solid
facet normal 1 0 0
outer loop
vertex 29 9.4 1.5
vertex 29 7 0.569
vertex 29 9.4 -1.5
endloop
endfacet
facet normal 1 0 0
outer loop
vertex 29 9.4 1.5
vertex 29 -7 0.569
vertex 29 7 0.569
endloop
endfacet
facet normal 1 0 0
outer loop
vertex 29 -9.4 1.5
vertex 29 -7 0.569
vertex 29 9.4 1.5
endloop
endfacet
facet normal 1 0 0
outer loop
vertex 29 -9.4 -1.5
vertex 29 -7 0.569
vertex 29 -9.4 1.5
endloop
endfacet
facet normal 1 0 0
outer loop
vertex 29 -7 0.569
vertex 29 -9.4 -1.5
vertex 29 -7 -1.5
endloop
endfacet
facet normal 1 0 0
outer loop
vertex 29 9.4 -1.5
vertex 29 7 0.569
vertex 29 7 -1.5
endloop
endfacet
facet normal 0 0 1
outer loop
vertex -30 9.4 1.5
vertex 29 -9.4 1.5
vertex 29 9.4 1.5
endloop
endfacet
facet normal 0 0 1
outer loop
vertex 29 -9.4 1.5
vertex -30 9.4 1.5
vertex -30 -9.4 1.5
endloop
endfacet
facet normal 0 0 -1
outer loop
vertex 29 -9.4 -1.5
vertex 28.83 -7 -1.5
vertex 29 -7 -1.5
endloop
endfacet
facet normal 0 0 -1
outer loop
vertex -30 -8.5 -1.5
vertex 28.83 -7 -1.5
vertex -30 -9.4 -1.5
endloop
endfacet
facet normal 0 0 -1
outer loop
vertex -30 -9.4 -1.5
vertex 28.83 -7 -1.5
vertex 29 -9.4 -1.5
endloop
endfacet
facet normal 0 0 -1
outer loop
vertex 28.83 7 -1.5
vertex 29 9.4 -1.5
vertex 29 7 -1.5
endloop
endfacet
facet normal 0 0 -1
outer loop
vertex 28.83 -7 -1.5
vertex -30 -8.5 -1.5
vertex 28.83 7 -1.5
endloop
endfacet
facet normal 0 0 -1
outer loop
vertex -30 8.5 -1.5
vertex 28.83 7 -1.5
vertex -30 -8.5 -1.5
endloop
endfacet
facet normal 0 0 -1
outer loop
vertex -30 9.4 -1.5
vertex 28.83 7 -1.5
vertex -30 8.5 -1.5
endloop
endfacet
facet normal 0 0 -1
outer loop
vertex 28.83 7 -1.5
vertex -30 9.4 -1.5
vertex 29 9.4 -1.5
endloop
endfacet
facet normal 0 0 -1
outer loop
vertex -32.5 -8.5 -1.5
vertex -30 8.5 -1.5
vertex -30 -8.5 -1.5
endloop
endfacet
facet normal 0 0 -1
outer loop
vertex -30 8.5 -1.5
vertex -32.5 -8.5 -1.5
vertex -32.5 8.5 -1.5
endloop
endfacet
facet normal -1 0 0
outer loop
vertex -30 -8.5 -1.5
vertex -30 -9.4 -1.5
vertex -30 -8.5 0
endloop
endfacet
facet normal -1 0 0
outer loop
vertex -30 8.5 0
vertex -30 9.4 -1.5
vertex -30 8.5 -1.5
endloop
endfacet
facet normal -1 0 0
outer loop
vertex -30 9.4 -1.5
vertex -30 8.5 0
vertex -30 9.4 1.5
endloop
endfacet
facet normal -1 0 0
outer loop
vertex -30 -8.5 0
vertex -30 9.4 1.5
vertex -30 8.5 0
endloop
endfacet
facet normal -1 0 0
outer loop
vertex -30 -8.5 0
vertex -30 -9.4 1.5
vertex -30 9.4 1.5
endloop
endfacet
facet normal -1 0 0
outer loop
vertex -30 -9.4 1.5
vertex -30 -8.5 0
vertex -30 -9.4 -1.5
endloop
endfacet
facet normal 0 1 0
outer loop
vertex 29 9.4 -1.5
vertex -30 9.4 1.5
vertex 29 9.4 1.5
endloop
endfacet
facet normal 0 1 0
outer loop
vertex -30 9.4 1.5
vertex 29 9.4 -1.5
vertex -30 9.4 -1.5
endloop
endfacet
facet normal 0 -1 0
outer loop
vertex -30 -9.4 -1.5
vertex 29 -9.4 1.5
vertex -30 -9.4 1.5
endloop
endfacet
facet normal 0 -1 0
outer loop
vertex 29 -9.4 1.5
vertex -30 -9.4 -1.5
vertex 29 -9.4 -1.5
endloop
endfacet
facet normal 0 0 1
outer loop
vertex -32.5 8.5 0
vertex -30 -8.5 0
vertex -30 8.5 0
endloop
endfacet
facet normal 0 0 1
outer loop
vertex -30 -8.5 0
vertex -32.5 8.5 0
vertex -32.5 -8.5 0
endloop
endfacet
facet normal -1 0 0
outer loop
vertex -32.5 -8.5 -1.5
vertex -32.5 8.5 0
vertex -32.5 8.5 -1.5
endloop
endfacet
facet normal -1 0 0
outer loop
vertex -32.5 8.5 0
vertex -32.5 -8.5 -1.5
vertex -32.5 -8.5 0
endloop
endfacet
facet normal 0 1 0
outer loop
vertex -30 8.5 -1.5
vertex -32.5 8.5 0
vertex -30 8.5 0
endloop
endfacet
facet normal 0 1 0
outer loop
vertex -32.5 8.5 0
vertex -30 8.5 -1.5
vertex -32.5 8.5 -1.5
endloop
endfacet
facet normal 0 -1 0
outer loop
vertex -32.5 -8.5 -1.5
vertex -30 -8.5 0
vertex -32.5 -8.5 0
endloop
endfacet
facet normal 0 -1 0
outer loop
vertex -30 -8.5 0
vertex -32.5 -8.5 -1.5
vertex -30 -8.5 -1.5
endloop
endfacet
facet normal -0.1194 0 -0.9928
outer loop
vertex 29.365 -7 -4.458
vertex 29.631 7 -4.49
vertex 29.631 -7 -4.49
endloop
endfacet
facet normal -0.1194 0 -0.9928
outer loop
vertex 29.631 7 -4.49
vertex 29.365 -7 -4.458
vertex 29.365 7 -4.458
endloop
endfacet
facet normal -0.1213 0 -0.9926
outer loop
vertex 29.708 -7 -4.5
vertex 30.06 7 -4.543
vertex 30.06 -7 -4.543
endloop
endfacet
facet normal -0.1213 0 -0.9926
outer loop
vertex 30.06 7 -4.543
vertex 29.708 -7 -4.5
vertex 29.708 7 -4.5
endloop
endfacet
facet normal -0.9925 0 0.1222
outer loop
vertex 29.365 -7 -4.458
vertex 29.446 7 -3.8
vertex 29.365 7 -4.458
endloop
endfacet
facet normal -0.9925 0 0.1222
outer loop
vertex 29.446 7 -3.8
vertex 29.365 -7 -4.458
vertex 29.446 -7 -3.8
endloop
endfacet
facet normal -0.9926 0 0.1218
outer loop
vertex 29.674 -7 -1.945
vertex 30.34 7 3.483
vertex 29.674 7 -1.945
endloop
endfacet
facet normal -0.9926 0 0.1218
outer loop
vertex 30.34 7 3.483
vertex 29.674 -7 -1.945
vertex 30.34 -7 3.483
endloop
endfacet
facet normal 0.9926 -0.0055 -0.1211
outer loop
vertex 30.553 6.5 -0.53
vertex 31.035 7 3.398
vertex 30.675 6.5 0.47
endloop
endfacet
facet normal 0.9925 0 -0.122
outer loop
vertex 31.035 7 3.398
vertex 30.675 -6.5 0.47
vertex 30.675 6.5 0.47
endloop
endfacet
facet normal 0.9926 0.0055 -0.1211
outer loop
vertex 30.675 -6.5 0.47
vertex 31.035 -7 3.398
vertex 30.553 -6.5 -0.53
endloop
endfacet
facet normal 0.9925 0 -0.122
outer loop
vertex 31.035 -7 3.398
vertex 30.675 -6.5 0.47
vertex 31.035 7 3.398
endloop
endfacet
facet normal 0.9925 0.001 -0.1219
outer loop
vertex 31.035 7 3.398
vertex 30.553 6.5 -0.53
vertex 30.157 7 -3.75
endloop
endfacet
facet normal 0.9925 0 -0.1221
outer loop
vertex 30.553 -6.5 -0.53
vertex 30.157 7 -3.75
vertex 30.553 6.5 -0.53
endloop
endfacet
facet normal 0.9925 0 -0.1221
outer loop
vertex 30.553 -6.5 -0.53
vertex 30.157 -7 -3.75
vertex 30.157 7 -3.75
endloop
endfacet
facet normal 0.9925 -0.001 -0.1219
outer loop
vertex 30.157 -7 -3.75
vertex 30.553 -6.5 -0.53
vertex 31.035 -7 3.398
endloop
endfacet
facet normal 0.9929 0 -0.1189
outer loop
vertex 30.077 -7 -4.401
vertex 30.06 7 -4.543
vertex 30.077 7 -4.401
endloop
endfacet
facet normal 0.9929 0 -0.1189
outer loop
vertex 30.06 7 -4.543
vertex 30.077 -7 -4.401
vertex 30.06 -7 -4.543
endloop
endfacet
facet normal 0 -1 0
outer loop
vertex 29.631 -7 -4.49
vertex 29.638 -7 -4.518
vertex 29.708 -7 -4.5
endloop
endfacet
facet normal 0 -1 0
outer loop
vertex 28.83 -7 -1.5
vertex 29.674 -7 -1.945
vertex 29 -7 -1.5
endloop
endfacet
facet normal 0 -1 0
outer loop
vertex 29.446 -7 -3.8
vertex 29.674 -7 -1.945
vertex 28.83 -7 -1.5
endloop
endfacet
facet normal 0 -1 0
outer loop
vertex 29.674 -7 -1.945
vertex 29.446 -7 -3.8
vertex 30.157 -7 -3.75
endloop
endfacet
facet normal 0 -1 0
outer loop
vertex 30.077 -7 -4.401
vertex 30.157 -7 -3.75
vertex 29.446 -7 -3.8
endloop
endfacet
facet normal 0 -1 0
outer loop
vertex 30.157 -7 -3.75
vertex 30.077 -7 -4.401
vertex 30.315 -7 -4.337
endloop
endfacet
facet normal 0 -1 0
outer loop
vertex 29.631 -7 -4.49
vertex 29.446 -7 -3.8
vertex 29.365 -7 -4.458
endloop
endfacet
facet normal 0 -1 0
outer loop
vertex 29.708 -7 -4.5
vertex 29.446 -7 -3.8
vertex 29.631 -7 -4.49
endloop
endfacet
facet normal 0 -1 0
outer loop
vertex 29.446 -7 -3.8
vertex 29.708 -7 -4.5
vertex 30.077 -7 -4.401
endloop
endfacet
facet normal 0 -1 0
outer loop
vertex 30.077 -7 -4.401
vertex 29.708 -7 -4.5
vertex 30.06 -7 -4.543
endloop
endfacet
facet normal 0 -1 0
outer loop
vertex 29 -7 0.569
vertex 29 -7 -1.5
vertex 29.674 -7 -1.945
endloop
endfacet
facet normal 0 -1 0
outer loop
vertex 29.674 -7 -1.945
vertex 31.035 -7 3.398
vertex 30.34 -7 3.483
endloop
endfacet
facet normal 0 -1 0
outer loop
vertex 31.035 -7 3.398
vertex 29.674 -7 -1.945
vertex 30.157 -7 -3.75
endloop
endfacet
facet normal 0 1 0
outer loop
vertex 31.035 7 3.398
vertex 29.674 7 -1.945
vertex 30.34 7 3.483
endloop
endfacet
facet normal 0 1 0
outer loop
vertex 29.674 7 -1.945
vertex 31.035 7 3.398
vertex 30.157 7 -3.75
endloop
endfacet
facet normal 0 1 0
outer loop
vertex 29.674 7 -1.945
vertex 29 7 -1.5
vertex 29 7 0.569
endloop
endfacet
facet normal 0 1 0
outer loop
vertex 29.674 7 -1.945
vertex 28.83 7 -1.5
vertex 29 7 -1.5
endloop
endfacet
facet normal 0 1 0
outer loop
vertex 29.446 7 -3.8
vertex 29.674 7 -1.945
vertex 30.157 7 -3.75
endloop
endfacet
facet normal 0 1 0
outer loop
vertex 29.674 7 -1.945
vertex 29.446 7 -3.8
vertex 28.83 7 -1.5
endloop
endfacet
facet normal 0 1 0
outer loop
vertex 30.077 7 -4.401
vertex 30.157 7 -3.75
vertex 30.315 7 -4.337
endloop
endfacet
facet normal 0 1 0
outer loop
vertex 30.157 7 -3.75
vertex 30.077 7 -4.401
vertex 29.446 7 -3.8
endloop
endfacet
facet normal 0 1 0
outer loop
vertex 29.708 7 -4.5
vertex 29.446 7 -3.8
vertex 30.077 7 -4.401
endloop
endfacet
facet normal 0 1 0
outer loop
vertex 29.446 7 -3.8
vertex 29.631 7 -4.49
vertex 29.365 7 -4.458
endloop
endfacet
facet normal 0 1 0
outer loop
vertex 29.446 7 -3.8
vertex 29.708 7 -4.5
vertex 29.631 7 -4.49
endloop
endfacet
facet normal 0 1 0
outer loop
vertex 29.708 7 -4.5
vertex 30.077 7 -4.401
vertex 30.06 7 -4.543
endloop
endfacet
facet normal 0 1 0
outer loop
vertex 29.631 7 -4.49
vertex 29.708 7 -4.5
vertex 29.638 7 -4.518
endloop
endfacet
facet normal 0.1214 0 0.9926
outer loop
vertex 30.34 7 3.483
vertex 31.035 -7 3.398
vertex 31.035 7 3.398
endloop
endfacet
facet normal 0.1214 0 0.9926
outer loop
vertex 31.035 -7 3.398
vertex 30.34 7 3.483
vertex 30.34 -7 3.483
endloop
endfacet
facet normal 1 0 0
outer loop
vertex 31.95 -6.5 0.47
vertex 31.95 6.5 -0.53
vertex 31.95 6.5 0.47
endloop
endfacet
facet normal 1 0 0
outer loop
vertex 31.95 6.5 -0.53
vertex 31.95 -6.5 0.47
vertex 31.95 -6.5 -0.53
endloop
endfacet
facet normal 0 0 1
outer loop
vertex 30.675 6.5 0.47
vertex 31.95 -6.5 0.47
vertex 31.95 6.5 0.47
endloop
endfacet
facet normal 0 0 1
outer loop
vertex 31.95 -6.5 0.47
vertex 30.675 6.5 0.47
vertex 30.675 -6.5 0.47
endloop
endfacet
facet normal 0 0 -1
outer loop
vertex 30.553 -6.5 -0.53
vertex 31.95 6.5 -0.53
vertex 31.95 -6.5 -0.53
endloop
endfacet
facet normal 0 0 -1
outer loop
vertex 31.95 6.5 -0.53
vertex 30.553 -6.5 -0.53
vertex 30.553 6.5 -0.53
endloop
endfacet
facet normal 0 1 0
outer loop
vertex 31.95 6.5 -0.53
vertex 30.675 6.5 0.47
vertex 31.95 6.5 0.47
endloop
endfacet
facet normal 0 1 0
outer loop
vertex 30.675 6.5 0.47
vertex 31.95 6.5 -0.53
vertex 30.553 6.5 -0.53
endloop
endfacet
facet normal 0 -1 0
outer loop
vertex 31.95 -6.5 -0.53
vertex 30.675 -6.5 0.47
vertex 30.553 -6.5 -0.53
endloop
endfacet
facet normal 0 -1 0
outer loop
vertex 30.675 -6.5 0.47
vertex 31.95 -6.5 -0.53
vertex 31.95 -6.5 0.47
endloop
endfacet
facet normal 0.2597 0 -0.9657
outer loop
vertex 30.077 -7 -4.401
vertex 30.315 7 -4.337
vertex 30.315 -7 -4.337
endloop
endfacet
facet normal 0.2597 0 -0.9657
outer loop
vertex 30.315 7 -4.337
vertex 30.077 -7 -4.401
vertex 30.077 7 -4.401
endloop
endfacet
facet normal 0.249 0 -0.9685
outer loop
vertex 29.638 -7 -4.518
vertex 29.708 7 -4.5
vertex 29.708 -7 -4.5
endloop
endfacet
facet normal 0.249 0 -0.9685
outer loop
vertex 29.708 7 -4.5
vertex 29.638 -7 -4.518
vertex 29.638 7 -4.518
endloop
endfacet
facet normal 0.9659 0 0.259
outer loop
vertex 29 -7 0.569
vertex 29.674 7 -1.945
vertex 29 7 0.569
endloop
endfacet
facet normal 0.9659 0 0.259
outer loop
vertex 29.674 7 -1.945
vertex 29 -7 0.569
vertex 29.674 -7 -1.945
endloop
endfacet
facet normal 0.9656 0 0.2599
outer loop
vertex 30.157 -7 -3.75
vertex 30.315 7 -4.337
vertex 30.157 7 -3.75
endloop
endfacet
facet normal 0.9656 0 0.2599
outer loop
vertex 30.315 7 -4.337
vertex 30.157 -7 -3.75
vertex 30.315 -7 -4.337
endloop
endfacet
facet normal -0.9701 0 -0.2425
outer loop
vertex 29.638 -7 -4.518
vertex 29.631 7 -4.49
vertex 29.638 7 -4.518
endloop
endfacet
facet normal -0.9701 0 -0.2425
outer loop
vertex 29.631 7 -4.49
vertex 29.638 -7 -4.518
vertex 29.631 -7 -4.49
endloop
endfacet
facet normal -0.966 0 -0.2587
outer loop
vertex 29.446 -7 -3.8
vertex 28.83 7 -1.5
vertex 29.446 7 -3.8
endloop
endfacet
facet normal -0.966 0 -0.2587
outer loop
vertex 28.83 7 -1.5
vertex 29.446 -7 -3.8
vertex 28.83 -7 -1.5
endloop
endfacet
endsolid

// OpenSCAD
$fn = 100;

module base() {
    difference() {
        cube([82, 31, 3], center=true);
        difference() {
            cube([82, 31, 3], center=true);
            translate([25.3,0,0]) {
                cylinder(h=3, r=15.8, center=true);
            }
            translate([-25.3,0,0]) {
                cylinder(h=3, r=15.8, center=true);
            }
            cube([57,31,4], center=true);
        }  
    }
}

module drillhole() {
    cylinder(h=3, r1=1, r2=2.25, center=true);
}


module drilled_base() {
    difference() {
        base();
        translate([37,0,0]) {
            drillhole();
        }
        translate([-37,0,0]) {
            drillhole();
        } 
    }
}

module lid() {
    translate([-0.5,0,0]) {
        cube([59,18.8,3], center=true);
        translate([-1.5,0,-0.75]) {
            cube([61,17,1.5], center=true);
        }
    }
    latch();
}

module lid_without_latch() {
    cube([60,19,3], center=true);
    translate([-1,0,-0.75]) {
        cube([62,19,1.5], center=true);
    }
    translate([1,0,0]) {
        cube([62,15,1.2], center=true);
    }
}

module latch_down() {
    rotate(a=75, v=[0,1,0]) {
        cube([6,14,0.7], center=true);
    }
}
module latch_up() {
    rotate(a=83, v=[0,-1,0]) {
        cube([8,14,0.7], center=true);
    }
}

module latch() {
    translate([29.2,0,-1.53]){
        latch_down();
        translate([1.0,0,1]) {
            latch_up();
            translate([0.25,-6.5,0]) {
                cube([1.5, 13, 1]);
            }
        }
    }
}

module final_base() {
    difference() {
        drilled_base();
        lid_without_latch();
    }
}


//drilled_base();
lid();
//final_base();
